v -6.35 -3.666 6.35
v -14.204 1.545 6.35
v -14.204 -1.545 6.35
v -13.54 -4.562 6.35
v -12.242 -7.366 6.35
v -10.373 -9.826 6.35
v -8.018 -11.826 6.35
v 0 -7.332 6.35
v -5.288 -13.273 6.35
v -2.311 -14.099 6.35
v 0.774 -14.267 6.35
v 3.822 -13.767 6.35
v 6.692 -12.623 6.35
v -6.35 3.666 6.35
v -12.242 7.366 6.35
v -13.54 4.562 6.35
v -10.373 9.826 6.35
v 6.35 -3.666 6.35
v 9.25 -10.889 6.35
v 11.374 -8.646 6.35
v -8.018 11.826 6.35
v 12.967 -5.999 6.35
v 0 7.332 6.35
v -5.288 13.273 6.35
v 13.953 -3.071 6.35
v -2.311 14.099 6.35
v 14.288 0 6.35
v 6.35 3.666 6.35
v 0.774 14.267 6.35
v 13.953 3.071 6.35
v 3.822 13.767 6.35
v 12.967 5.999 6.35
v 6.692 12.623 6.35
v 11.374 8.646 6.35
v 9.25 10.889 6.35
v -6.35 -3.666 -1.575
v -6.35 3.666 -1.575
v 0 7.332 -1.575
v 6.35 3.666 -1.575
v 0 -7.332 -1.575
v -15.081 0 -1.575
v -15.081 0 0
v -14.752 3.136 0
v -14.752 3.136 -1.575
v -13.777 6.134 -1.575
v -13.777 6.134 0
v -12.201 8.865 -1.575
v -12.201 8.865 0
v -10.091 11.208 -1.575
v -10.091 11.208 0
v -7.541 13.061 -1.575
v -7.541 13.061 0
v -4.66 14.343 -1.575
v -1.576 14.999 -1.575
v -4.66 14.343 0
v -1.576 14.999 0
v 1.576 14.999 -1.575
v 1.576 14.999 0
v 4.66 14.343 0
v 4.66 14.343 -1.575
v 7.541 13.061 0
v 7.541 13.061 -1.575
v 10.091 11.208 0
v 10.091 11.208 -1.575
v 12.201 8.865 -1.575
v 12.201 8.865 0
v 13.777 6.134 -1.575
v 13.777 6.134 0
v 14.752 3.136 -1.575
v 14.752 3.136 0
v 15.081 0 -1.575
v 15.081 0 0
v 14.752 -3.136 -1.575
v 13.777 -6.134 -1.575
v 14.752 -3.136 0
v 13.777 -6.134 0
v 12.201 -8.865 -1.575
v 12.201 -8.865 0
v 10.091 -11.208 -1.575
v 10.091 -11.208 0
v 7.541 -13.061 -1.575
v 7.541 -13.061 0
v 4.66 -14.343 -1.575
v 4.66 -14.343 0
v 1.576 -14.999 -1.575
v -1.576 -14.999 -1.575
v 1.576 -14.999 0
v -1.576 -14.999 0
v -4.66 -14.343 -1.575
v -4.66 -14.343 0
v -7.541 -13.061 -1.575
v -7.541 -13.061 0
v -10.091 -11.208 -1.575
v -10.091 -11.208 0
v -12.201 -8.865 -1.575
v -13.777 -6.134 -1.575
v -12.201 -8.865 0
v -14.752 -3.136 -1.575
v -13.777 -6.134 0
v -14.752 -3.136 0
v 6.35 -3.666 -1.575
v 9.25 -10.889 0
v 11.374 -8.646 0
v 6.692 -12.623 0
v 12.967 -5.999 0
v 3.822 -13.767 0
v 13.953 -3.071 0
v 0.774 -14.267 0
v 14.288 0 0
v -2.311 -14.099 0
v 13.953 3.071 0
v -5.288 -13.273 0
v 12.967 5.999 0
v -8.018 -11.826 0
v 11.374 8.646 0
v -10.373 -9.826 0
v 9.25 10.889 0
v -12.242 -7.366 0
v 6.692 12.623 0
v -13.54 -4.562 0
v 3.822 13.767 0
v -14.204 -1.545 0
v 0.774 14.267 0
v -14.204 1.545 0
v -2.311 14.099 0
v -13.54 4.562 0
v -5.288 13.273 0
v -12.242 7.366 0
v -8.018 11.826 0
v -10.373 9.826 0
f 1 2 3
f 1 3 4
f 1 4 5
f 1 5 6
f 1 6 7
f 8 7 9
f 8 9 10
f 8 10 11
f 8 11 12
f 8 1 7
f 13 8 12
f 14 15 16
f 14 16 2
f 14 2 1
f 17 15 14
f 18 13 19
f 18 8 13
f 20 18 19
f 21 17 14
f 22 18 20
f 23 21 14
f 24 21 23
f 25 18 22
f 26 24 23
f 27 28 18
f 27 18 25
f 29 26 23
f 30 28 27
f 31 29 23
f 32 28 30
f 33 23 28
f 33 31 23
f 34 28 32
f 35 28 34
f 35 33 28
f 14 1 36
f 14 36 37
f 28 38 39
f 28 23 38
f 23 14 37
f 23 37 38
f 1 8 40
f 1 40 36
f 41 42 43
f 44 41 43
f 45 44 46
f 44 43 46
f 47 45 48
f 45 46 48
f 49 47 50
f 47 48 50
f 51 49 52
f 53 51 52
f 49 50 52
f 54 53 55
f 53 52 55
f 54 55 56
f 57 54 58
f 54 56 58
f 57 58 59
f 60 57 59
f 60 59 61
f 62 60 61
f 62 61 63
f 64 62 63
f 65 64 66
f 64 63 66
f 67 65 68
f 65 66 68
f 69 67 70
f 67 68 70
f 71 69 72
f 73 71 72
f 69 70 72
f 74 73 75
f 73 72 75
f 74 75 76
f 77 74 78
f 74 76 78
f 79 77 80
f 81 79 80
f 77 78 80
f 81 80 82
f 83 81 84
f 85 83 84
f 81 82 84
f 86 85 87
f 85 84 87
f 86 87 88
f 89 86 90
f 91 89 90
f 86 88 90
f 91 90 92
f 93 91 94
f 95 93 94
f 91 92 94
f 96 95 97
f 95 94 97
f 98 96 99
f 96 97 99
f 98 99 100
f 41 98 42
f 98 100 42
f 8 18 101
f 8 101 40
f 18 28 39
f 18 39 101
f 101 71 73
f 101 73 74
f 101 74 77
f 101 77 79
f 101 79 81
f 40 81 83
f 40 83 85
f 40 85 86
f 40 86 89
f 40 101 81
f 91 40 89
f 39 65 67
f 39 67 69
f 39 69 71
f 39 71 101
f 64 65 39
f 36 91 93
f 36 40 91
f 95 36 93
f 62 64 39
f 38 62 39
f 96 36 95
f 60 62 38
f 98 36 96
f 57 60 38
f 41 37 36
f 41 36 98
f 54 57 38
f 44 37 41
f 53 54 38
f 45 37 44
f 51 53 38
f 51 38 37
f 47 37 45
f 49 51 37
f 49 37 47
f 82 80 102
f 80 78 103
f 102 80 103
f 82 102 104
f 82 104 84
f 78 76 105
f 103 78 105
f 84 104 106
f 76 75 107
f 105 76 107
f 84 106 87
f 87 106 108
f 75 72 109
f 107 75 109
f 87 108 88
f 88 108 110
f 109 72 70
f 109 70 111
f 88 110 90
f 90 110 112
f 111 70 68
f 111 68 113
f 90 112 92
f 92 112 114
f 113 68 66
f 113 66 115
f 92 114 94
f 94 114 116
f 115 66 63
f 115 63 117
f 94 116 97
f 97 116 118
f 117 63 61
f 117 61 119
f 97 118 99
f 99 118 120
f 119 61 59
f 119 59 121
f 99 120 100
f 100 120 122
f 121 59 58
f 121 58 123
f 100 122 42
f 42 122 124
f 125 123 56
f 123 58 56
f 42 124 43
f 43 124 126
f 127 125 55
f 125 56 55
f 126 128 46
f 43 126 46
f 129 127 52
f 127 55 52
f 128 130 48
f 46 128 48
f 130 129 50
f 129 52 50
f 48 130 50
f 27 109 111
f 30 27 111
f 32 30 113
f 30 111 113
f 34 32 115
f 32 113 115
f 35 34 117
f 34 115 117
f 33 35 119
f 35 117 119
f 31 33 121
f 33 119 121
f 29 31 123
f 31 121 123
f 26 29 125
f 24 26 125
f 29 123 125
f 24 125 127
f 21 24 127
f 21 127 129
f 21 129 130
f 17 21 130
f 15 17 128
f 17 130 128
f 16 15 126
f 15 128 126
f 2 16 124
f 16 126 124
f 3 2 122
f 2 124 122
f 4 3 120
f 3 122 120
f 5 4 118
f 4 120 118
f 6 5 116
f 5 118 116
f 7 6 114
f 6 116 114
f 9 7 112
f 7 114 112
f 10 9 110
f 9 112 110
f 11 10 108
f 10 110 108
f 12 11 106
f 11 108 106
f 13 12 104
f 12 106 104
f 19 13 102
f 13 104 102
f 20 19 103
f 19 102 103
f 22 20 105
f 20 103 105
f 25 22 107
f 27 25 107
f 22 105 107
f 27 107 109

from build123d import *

# Parameters (mm, degrees)
SKETCH1_R           = 14.2875
BOSS_EXTRUDE1_DEPTH = 6.35
SKETCH2_R           = 15.08125
BOSS_EXTRUDE2_DEPTH = 1.5748


with BuildPart() as part:
    # Sketch1 → Boss-Extrude1 (new body)
    with BuildSketch(Plane.XY):
        Circle(SKETCH1_R)
        Polygon((6.35, 3.666174209), (0, 7.332348419), (-6.35, 3.666174209), (-6.35, -3.666174209), (0, -7.332348419), (6.35, -3.666174209), align=None, mode=Mode.SUBTRACT)
    extrude(amount=BOSS_EXTRUDE1_DEPTH)

    # Sketch2 → Boss-Extrude2 (add)
    with BuildSketch(Plane(origin=(0, 0, 0), x_dir=(-1, 0, 0), z_dir=(0, 0, -1))):
        Circle(SKETCH2_R)
        Polygon((0, 7.332348419), (-6.35, 3.666174209), (-6.35, -3.666174209), (0, -7.332348419), (6.35, -3.666174209), (6.35, 3.666174209), align=None, mode=Mode.SUBTRACT)
    extrude(amount=BOSS_EXTRUDE2_DEPTH)


solid = part.part
